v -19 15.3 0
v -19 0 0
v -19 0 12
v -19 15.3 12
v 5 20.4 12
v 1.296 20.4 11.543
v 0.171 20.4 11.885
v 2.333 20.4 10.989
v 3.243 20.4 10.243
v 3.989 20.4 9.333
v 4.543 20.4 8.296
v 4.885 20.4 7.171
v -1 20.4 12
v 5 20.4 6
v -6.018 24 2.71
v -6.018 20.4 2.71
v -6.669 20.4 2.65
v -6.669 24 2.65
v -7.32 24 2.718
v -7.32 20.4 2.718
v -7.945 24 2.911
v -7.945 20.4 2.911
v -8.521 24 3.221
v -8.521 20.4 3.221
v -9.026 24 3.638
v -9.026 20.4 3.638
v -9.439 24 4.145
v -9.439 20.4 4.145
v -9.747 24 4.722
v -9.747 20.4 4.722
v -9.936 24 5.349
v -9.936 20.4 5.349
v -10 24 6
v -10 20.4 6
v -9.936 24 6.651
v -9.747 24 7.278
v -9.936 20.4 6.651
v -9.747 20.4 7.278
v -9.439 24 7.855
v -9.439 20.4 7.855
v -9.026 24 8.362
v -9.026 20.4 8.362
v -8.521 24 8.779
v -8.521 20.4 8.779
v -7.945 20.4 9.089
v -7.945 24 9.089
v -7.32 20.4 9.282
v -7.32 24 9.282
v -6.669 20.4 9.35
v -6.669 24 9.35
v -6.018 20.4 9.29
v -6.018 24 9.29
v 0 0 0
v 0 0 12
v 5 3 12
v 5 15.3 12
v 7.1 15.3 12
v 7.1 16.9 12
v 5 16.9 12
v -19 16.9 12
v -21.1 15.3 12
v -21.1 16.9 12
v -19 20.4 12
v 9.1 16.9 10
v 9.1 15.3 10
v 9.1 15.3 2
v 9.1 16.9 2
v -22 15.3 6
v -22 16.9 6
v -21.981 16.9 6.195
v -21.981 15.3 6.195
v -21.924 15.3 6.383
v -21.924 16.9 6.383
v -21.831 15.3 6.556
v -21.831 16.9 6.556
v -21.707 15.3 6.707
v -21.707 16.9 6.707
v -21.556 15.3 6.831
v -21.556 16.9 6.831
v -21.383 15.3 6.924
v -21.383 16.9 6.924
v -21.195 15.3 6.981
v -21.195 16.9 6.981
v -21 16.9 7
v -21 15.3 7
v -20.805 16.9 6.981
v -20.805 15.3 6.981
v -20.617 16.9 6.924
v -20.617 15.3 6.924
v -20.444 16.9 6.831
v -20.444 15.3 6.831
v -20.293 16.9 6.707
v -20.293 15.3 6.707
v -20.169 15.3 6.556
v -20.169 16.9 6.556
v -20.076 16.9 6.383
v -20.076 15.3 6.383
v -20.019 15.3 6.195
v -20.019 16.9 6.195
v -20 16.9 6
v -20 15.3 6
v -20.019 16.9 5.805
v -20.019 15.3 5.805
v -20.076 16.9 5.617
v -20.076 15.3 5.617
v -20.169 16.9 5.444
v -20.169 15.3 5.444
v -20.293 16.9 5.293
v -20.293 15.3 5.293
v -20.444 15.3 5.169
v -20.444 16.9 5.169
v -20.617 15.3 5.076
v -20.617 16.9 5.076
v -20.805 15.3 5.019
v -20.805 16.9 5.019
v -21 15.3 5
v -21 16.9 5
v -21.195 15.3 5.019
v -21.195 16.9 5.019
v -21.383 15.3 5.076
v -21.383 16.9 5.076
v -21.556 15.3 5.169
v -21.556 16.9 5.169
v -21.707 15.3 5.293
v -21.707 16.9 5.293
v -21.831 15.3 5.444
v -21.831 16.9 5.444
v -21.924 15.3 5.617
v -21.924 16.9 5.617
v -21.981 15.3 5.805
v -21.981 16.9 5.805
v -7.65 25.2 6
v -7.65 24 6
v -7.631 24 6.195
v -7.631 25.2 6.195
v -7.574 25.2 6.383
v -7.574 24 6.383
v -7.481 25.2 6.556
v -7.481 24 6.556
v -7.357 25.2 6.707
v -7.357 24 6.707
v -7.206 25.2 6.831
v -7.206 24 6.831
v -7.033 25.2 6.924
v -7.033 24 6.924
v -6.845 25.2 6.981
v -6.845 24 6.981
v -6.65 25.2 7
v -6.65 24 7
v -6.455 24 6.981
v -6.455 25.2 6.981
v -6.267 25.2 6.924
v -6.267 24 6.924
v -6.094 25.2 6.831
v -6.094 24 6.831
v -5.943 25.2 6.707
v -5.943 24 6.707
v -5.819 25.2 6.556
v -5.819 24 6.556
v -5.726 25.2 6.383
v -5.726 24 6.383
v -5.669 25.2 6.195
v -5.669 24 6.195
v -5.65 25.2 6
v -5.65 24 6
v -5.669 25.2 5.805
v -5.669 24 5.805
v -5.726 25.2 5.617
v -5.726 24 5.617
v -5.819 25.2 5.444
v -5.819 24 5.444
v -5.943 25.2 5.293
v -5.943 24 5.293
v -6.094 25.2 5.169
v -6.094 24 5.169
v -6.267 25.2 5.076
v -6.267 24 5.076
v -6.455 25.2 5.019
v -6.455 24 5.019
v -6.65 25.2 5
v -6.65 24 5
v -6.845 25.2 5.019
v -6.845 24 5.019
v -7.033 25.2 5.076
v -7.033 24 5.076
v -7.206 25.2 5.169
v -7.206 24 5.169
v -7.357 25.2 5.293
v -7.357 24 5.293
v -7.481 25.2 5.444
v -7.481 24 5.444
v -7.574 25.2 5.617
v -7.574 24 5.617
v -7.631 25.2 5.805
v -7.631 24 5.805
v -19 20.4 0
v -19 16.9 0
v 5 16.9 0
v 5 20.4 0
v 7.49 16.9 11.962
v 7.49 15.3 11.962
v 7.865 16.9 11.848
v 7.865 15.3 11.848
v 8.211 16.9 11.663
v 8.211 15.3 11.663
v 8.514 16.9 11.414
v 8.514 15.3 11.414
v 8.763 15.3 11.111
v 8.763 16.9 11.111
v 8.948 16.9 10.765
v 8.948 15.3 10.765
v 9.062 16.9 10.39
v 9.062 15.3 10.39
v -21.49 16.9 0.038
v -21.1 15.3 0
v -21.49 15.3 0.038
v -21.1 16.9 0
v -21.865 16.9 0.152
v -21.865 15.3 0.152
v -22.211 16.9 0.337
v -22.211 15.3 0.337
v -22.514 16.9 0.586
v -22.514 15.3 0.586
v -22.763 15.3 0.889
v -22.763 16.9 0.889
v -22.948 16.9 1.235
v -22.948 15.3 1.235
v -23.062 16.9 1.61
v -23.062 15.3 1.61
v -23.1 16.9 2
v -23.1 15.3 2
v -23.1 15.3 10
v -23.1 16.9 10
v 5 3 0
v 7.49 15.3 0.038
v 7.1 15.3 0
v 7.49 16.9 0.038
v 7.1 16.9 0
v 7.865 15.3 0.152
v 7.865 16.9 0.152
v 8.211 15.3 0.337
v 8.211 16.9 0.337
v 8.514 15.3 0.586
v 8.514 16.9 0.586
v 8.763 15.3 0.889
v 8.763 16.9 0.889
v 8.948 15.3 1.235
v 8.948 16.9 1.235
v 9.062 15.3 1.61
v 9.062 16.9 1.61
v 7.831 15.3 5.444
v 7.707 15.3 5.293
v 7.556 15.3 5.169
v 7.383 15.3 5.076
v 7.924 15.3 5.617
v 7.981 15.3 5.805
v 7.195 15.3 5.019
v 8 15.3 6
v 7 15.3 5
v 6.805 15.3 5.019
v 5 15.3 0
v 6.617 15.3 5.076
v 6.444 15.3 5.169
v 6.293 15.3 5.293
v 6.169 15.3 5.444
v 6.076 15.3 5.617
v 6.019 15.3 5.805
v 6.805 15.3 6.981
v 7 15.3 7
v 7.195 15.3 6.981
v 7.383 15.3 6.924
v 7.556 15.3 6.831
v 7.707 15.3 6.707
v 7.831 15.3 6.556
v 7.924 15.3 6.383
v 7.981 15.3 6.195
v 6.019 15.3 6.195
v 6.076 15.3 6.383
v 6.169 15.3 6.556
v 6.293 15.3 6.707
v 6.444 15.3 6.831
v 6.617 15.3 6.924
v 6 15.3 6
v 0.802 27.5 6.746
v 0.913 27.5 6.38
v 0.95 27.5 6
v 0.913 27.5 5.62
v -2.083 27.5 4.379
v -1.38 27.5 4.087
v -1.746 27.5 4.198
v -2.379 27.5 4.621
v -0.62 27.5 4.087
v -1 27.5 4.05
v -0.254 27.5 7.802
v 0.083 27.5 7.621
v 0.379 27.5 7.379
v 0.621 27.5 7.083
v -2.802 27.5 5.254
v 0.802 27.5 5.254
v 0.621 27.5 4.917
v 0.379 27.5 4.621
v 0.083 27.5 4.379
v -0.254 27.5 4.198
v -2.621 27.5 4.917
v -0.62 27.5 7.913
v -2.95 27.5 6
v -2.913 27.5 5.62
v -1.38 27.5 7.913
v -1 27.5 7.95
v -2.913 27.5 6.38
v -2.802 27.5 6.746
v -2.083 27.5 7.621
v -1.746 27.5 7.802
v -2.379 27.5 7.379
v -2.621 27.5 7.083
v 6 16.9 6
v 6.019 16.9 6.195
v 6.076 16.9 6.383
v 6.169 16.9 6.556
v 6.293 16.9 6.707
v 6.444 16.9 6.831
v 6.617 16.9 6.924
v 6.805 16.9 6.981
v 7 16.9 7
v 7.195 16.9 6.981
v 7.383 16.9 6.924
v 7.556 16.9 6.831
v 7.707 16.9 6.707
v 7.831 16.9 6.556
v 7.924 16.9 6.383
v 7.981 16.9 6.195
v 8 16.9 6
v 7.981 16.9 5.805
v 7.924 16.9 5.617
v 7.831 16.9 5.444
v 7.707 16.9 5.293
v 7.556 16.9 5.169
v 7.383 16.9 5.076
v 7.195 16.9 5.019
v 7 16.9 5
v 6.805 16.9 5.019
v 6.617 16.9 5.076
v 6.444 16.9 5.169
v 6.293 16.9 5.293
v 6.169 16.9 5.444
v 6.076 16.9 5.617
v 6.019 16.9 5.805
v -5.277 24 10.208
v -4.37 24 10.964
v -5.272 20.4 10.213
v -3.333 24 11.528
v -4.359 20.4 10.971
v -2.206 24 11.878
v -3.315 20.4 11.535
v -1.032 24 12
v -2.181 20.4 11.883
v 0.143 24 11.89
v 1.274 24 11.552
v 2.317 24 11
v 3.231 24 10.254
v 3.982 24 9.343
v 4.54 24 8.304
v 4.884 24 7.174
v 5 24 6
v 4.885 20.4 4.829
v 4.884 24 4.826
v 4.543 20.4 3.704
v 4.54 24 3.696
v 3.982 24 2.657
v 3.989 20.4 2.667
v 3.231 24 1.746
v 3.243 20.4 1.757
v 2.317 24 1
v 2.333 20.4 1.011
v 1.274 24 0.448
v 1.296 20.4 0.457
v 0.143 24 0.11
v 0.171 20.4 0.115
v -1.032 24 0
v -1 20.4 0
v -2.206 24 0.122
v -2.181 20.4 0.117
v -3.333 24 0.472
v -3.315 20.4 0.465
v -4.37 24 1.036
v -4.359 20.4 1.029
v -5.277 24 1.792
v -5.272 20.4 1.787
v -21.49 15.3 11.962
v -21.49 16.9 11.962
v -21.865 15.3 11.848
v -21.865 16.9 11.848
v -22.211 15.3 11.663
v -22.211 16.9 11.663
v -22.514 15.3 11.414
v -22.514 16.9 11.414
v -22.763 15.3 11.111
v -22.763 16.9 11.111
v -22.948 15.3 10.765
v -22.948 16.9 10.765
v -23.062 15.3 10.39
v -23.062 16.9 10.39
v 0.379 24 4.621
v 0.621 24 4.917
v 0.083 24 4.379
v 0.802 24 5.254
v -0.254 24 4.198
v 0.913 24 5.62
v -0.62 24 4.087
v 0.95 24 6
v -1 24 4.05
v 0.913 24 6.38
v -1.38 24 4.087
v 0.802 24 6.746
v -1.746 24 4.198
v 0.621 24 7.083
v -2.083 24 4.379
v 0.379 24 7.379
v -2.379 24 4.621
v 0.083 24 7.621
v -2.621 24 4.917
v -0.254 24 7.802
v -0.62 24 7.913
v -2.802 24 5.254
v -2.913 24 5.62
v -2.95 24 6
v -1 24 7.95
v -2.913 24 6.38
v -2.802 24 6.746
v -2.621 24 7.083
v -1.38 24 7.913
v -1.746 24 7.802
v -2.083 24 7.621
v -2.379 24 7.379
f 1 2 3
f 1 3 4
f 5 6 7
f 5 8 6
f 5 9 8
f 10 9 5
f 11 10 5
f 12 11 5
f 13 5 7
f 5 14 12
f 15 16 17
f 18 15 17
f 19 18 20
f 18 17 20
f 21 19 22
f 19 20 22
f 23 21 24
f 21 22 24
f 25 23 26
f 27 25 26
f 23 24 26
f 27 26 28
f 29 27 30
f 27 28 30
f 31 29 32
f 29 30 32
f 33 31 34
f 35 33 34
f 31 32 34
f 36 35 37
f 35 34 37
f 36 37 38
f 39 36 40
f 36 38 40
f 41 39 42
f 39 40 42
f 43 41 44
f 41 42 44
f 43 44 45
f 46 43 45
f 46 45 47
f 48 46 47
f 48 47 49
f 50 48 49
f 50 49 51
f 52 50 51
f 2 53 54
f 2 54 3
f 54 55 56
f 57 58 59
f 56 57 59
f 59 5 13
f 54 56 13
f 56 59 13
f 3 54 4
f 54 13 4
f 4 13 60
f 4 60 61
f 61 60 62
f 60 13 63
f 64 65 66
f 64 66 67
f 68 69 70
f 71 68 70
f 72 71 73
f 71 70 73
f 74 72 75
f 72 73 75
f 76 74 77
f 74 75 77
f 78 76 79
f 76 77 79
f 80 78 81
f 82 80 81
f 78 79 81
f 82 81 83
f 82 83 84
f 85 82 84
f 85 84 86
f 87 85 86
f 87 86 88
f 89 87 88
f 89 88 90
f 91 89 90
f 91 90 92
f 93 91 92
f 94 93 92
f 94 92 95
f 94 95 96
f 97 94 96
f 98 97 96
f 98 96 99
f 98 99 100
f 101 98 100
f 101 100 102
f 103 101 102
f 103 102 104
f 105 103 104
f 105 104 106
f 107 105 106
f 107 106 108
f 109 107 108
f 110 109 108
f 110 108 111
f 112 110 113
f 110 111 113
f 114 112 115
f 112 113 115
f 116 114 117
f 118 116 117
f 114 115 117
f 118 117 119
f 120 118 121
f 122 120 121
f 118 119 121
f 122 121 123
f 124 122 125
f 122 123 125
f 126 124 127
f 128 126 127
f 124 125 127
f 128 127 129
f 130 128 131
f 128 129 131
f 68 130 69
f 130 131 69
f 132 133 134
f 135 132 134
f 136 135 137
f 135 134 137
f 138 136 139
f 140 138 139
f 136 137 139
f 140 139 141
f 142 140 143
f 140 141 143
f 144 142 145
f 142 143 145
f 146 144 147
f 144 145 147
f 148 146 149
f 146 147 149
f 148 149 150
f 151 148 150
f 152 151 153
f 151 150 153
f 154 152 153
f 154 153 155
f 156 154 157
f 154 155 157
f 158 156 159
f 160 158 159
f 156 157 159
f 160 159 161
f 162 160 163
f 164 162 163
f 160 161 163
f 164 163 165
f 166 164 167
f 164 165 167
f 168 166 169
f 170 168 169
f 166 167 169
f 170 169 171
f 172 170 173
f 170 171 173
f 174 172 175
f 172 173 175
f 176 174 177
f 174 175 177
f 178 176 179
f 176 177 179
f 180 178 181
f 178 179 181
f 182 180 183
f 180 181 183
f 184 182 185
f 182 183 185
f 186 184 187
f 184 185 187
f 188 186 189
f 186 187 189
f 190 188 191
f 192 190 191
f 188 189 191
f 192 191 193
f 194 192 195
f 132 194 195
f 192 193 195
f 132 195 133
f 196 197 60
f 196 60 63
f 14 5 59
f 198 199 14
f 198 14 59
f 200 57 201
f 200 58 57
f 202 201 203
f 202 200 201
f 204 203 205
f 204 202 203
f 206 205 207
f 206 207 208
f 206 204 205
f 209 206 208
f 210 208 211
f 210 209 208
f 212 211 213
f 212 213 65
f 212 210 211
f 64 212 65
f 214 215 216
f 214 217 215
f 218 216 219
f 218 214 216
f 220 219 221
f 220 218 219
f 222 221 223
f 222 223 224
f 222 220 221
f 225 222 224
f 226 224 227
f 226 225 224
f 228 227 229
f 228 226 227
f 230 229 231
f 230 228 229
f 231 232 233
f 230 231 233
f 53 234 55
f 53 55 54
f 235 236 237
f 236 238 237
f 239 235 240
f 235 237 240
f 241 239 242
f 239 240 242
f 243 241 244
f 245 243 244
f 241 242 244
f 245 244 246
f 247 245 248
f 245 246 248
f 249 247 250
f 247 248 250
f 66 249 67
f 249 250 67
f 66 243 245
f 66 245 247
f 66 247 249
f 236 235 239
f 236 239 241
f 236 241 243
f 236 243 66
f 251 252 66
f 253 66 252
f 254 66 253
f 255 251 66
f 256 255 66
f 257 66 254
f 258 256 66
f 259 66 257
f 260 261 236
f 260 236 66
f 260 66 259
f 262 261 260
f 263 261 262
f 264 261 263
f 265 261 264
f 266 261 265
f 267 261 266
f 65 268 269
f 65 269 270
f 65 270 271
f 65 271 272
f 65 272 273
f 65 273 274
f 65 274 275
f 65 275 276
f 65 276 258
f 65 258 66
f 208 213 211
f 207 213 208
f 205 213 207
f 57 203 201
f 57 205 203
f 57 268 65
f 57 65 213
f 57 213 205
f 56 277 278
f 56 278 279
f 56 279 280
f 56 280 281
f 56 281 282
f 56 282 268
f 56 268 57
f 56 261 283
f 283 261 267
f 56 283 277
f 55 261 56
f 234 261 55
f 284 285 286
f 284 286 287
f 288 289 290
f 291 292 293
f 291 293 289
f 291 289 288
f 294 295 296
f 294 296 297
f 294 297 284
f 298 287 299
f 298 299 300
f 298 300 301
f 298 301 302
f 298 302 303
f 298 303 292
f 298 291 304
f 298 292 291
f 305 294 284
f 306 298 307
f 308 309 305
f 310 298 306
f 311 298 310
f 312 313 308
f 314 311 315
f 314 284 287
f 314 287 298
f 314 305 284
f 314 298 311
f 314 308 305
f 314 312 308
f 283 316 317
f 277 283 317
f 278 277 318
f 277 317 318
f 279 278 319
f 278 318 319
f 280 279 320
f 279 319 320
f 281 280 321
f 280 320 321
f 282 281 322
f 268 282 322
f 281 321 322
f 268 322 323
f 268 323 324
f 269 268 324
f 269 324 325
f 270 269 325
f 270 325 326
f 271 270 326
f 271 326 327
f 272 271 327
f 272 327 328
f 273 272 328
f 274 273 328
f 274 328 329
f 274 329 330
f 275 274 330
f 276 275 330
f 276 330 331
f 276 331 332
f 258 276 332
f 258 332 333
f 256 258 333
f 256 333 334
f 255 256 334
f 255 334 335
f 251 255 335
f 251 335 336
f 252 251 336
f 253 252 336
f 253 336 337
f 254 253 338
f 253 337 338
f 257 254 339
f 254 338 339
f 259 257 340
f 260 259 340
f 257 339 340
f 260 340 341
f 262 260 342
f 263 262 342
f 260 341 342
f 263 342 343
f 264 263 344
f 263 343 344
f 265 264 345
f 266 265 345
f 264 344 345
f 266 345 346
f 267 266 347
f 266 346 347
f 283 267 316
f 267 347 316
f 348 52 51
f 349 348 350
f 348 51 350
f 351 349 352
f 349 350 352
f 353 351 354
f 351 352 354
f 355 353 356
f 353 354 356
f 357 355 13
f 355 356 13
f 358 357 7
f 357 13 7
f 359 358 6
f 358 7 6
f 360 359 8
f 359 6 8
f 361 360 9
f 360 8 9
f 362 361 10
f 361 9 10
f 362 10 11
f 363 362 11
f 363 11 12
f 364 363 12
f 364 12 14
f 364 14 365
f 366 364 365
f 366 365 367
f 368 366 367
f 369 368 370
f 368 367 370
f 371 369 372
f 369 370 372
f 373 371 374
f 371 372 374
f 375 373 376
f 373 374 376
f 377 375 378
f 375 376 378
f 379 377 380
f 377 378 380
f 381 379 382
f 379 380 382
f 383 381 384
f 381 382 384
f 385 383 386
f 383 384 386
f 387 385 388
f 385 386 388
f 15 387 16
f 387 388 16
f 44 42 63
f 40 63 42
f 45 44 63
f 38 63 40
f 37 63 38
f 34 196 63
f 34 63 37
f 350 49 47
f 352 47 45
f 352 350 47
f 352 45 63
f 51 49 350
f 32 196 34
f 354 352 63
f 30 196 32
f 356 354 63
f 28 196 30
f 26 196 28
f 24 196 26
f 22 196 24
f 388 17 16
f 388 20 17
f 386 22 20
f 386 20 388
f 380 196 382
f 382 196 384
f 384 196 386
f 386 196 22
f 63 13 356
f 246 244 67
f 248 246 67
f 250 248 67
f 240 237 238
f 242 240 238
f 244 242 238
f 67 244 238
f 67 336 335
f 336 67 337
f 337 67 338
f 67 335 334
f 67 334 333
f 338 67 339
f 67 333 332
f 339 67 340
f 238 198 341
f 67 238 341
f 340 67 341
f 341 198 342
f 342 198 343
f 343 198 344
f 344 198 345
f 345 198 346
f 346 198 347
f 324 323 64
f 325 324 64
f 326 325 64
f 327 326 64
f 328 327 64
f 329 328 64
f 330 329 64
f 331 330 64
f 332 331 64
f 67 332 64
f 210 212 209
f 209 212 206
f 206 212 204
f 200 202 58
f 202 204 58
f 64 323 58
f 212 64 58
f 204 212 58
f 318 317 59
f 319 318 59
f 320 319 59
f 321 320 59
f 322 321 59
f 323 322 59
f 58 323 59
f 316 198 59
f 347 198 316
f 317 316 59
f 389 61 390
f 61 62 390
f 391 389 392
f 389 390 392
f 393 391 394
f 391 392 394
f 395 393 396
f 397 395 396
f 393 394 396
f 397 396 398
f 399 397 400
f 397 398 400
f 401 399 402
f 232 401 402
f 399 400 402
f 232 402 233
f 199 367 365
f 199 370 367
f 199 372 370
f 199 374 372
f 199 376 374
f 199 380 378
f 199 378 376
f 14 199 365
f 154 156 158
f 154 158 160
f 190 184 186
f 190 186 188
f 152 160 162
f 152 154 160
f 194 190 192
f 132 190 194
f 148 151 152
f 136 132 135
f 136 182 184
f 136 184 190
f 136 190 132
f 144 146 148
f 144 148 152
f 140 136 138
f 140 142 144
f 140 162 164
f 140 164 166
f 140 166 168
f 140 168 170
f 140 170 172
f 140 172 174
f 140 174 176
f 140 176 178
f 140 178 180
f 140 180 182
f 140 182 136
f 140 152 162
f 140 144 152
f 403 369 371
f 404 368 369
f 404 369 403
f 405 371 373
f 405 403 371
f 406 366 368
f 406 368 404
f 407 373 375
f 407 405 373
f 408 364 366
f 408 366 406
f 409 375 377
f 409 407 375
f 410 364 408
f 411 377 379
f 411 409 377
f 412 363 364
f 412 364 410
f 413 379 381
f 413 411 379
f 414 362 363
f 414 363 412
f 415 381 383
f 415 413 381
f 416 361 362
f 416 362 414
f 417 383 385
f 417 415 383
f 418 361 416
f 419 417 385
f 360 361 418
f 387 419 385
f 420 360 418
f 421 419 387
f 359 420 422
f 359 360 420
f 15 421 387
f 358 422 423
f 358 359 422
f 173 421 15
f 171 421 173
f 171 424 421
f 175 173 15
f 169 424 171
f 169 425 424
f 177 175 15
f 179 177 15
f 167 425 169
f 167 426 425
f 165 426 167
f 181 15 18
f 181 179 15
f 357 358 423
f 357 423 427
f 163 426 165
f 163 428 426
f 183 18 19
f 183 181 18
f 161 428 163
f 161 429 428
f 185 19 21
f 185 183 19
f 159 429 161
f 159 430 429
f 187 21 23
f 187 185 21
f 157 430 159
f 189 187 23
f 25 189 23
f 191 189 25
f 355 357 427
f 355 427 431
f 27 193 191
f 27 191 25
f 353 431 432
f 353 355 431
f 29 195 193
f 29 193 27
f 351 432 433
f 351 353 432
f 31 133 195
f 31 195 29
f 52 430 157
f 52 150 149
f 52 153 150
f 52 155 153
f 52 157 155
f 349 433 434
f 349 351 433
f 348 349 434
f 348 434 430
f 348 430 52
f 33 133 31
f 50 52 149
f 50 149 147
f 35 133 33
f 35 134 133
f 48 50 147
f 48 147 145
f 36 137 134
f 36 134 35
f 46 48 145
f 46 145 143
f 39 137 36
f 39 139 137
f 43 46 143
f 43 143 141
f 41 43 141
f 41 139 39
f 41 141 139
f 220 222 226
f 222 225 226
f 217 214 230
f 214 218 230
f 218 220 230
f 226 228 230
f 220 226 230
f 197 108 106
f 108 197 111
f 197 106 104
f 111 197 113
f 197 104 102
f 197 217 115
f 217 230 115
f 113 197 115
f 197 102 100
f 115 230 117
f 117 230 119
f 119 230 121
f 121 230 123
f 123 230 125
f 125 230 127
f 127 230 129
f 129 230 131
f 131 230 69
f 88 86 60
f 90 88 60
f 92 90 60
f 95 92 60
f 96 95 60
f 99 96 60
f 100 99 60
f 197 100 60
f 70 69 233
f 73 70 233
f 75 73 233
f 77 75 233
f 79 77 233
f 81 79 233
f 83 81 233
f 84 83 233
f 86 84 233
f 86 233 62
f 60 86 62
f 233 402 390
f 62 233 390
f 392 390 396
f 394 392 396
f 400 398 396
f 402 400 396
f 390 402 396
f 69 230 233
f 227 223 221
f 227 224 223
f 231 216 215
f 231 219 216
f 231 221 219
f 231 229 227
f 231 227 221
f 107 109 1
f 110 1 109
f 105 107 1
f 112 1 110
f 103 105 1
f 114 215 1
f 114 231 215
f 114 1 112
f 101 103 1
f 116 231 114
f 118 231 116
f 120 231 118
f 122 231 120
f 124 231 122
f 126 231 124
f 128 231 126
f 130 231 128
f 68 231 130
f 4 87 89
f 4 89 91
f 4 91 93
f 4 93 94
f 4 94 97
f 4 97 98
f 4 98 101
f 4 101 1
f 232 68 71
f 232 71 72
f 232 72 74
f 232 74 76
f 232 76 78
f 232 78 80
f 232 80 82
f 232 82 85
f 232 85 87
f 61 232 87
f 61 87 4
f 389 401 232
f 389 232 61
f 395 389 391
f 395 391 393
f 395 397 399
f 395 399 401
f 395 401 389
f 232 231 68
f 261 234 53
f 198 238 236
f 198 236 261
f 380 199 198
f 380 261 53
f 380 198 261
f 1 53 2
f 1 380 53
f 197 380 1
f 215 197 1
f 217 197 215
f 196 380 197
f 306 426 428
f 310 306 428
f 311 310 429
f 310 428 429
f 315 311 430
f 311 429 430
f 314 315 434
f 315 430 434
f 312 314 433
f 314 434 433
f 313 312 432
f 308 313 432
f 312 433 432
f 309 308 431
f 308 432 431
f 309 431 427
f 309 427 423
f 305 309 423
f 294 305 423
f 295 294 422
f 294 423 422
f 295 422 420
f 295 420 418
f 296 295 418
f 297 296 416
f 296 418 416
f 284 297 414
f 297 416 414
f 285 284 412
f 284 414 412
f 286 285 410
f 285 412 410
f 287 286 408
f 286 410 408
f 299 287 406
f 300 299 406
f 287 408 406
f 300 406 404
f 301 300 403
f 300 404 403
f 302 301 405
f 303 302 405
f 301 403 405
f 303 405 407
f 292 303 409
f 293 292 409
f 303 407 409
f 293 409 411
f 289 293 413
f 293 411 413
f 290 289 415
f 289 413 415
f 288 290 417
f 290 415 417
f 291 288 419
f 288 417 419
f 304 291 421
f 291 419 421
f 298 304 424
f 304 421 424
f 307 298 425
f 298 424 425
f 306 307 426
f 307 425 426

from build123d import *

# Parameters (mm, degrees)
PAD_DEPTH           = 12
SKETCH001_W         = 1.6
SKETCH001_H         = 12
PAD001_DEPTH        = 4.1
LINEARPATTERN_COUNT = 2
LINEARPATTERN_PITCH = 28.1
PAD002_DEPTH        = 3.6
SKETCH004_R         = 1.95
PAD003_DEPTH        = 3.5
SKETCH005_R         = 1
PAD004_DEPTH        = 1.2
FILLET_R            = 2
FILLET001_R         = 2
FILLET002_R         = 2
FILLET003_R         = 2
SKETCH006_R         = 1
POCKET_DEPTH        = 16.901


with BuildPart() as part:
    # Sketch → Pad (new body)
    with BuildSketch(Plane.XY):
        Polygon((-19, 20.4), (5, 20.4), (5, 3), (0, 0), (-19, 0), align=None)
    extrude(amount=PAD_DEPTH)

    # Sketch001 → Pad001 (new body)
    with BuildSketch(Plane.YZ.offset(5)):
        with Locations((16.1, 6)):
            Rectangle(SKETCH001_W, SKETCH001_H)
    pad001 = extrude(amount=PAD001_DEPTH)

    # LinearPattern: Pad001 ×2
    with Locations(*[(-i * LINEARPATTERN_PITCH, 0, 0) for i in range(1, LINEARPATTERN_COUNT)]):
        add(pad001)

    # Sketch003 → Pad002 (new body)
    with BuildSketch(Plane(origin=(0, 20.4, 0), x_dir=(-1, 0, 0), z_dir=(0, 1, 0))):
        with BuildLine():
            ThreePointArc((6.017699, 9.289787), (-5, 6), (6.017699, 2.710213))
            ThreePointArc((6.017699, 2.710213), (10, 6), (6.017699, 9.289787))
        make_face()
    extrude(amount=PAD002_DEPTH)

    # Sketch004 → Pad003 (new body)
    with BuildSketch(Plane(origin=(0, 24, 0), x_dir=(-1, 0, 0), z_dir=(0, 1, 0))):
        with Locations((1, 6)):
            Circle(SKETCH004_R)
    extrude(amount=PAD003_DEPTH)

    # Sketch005 → Pad004 (new body)
    with BuildSketch(Plane(origin=(0, 24, 0), x_dir=(-1, 0, 0), z_dir=(0, 1, 0))):
        with Locations((6.65, 6)):
            Circle(SKETCH005_R)
    extrude(amount=PAD004_DEPTH)

    # Fillet
    fillet_edges = [part.edges().sort_by_distance(p)[0] for p in [
        (9.1, 16.1, 12),
    ]]
    fillet(fillet_edges, radius=FILLET_R)

    # Fillet001
    fillet001_edges = [part.edges().sort_by_distance(p)[0] for p in [
        (-23.1, 16.1, 12),
    ]]
    fillet(fillet001_edges, radius=FILLET001_R)

    # Fillet002
    fillet002_edges = [part.edges().sort_by_distance(p)[0] for p in [
        (9.1, 16.1, 0),
    ]]
    fillet(fillet002_edges, radius=FILLET002_R)

    # Fillet003
    fillet003_edges = [part.edges().sort_by_distance(p)[0] for p in [
        (-23.1, 16.1, 0),
    ]]
    fillet(fillet003_edges, radius=FILLET003_R)

    # Sketch006 → Pocket (cut, through all)
    with BuildSketch(Plane(origin=(0, 16.9, 0), x_dir=(-1, 0, 0), z_dir=(0, 1, 0))):
        with Locations((-7, 6)):
            Circle(SKETCH006_R)
        with Locations((21, 6)):
            Circle(SKETCH006_R)
    extrude(amount=-POCKET_DEPTH, mode=Mode.SUBTRACT)


solid = part.part
